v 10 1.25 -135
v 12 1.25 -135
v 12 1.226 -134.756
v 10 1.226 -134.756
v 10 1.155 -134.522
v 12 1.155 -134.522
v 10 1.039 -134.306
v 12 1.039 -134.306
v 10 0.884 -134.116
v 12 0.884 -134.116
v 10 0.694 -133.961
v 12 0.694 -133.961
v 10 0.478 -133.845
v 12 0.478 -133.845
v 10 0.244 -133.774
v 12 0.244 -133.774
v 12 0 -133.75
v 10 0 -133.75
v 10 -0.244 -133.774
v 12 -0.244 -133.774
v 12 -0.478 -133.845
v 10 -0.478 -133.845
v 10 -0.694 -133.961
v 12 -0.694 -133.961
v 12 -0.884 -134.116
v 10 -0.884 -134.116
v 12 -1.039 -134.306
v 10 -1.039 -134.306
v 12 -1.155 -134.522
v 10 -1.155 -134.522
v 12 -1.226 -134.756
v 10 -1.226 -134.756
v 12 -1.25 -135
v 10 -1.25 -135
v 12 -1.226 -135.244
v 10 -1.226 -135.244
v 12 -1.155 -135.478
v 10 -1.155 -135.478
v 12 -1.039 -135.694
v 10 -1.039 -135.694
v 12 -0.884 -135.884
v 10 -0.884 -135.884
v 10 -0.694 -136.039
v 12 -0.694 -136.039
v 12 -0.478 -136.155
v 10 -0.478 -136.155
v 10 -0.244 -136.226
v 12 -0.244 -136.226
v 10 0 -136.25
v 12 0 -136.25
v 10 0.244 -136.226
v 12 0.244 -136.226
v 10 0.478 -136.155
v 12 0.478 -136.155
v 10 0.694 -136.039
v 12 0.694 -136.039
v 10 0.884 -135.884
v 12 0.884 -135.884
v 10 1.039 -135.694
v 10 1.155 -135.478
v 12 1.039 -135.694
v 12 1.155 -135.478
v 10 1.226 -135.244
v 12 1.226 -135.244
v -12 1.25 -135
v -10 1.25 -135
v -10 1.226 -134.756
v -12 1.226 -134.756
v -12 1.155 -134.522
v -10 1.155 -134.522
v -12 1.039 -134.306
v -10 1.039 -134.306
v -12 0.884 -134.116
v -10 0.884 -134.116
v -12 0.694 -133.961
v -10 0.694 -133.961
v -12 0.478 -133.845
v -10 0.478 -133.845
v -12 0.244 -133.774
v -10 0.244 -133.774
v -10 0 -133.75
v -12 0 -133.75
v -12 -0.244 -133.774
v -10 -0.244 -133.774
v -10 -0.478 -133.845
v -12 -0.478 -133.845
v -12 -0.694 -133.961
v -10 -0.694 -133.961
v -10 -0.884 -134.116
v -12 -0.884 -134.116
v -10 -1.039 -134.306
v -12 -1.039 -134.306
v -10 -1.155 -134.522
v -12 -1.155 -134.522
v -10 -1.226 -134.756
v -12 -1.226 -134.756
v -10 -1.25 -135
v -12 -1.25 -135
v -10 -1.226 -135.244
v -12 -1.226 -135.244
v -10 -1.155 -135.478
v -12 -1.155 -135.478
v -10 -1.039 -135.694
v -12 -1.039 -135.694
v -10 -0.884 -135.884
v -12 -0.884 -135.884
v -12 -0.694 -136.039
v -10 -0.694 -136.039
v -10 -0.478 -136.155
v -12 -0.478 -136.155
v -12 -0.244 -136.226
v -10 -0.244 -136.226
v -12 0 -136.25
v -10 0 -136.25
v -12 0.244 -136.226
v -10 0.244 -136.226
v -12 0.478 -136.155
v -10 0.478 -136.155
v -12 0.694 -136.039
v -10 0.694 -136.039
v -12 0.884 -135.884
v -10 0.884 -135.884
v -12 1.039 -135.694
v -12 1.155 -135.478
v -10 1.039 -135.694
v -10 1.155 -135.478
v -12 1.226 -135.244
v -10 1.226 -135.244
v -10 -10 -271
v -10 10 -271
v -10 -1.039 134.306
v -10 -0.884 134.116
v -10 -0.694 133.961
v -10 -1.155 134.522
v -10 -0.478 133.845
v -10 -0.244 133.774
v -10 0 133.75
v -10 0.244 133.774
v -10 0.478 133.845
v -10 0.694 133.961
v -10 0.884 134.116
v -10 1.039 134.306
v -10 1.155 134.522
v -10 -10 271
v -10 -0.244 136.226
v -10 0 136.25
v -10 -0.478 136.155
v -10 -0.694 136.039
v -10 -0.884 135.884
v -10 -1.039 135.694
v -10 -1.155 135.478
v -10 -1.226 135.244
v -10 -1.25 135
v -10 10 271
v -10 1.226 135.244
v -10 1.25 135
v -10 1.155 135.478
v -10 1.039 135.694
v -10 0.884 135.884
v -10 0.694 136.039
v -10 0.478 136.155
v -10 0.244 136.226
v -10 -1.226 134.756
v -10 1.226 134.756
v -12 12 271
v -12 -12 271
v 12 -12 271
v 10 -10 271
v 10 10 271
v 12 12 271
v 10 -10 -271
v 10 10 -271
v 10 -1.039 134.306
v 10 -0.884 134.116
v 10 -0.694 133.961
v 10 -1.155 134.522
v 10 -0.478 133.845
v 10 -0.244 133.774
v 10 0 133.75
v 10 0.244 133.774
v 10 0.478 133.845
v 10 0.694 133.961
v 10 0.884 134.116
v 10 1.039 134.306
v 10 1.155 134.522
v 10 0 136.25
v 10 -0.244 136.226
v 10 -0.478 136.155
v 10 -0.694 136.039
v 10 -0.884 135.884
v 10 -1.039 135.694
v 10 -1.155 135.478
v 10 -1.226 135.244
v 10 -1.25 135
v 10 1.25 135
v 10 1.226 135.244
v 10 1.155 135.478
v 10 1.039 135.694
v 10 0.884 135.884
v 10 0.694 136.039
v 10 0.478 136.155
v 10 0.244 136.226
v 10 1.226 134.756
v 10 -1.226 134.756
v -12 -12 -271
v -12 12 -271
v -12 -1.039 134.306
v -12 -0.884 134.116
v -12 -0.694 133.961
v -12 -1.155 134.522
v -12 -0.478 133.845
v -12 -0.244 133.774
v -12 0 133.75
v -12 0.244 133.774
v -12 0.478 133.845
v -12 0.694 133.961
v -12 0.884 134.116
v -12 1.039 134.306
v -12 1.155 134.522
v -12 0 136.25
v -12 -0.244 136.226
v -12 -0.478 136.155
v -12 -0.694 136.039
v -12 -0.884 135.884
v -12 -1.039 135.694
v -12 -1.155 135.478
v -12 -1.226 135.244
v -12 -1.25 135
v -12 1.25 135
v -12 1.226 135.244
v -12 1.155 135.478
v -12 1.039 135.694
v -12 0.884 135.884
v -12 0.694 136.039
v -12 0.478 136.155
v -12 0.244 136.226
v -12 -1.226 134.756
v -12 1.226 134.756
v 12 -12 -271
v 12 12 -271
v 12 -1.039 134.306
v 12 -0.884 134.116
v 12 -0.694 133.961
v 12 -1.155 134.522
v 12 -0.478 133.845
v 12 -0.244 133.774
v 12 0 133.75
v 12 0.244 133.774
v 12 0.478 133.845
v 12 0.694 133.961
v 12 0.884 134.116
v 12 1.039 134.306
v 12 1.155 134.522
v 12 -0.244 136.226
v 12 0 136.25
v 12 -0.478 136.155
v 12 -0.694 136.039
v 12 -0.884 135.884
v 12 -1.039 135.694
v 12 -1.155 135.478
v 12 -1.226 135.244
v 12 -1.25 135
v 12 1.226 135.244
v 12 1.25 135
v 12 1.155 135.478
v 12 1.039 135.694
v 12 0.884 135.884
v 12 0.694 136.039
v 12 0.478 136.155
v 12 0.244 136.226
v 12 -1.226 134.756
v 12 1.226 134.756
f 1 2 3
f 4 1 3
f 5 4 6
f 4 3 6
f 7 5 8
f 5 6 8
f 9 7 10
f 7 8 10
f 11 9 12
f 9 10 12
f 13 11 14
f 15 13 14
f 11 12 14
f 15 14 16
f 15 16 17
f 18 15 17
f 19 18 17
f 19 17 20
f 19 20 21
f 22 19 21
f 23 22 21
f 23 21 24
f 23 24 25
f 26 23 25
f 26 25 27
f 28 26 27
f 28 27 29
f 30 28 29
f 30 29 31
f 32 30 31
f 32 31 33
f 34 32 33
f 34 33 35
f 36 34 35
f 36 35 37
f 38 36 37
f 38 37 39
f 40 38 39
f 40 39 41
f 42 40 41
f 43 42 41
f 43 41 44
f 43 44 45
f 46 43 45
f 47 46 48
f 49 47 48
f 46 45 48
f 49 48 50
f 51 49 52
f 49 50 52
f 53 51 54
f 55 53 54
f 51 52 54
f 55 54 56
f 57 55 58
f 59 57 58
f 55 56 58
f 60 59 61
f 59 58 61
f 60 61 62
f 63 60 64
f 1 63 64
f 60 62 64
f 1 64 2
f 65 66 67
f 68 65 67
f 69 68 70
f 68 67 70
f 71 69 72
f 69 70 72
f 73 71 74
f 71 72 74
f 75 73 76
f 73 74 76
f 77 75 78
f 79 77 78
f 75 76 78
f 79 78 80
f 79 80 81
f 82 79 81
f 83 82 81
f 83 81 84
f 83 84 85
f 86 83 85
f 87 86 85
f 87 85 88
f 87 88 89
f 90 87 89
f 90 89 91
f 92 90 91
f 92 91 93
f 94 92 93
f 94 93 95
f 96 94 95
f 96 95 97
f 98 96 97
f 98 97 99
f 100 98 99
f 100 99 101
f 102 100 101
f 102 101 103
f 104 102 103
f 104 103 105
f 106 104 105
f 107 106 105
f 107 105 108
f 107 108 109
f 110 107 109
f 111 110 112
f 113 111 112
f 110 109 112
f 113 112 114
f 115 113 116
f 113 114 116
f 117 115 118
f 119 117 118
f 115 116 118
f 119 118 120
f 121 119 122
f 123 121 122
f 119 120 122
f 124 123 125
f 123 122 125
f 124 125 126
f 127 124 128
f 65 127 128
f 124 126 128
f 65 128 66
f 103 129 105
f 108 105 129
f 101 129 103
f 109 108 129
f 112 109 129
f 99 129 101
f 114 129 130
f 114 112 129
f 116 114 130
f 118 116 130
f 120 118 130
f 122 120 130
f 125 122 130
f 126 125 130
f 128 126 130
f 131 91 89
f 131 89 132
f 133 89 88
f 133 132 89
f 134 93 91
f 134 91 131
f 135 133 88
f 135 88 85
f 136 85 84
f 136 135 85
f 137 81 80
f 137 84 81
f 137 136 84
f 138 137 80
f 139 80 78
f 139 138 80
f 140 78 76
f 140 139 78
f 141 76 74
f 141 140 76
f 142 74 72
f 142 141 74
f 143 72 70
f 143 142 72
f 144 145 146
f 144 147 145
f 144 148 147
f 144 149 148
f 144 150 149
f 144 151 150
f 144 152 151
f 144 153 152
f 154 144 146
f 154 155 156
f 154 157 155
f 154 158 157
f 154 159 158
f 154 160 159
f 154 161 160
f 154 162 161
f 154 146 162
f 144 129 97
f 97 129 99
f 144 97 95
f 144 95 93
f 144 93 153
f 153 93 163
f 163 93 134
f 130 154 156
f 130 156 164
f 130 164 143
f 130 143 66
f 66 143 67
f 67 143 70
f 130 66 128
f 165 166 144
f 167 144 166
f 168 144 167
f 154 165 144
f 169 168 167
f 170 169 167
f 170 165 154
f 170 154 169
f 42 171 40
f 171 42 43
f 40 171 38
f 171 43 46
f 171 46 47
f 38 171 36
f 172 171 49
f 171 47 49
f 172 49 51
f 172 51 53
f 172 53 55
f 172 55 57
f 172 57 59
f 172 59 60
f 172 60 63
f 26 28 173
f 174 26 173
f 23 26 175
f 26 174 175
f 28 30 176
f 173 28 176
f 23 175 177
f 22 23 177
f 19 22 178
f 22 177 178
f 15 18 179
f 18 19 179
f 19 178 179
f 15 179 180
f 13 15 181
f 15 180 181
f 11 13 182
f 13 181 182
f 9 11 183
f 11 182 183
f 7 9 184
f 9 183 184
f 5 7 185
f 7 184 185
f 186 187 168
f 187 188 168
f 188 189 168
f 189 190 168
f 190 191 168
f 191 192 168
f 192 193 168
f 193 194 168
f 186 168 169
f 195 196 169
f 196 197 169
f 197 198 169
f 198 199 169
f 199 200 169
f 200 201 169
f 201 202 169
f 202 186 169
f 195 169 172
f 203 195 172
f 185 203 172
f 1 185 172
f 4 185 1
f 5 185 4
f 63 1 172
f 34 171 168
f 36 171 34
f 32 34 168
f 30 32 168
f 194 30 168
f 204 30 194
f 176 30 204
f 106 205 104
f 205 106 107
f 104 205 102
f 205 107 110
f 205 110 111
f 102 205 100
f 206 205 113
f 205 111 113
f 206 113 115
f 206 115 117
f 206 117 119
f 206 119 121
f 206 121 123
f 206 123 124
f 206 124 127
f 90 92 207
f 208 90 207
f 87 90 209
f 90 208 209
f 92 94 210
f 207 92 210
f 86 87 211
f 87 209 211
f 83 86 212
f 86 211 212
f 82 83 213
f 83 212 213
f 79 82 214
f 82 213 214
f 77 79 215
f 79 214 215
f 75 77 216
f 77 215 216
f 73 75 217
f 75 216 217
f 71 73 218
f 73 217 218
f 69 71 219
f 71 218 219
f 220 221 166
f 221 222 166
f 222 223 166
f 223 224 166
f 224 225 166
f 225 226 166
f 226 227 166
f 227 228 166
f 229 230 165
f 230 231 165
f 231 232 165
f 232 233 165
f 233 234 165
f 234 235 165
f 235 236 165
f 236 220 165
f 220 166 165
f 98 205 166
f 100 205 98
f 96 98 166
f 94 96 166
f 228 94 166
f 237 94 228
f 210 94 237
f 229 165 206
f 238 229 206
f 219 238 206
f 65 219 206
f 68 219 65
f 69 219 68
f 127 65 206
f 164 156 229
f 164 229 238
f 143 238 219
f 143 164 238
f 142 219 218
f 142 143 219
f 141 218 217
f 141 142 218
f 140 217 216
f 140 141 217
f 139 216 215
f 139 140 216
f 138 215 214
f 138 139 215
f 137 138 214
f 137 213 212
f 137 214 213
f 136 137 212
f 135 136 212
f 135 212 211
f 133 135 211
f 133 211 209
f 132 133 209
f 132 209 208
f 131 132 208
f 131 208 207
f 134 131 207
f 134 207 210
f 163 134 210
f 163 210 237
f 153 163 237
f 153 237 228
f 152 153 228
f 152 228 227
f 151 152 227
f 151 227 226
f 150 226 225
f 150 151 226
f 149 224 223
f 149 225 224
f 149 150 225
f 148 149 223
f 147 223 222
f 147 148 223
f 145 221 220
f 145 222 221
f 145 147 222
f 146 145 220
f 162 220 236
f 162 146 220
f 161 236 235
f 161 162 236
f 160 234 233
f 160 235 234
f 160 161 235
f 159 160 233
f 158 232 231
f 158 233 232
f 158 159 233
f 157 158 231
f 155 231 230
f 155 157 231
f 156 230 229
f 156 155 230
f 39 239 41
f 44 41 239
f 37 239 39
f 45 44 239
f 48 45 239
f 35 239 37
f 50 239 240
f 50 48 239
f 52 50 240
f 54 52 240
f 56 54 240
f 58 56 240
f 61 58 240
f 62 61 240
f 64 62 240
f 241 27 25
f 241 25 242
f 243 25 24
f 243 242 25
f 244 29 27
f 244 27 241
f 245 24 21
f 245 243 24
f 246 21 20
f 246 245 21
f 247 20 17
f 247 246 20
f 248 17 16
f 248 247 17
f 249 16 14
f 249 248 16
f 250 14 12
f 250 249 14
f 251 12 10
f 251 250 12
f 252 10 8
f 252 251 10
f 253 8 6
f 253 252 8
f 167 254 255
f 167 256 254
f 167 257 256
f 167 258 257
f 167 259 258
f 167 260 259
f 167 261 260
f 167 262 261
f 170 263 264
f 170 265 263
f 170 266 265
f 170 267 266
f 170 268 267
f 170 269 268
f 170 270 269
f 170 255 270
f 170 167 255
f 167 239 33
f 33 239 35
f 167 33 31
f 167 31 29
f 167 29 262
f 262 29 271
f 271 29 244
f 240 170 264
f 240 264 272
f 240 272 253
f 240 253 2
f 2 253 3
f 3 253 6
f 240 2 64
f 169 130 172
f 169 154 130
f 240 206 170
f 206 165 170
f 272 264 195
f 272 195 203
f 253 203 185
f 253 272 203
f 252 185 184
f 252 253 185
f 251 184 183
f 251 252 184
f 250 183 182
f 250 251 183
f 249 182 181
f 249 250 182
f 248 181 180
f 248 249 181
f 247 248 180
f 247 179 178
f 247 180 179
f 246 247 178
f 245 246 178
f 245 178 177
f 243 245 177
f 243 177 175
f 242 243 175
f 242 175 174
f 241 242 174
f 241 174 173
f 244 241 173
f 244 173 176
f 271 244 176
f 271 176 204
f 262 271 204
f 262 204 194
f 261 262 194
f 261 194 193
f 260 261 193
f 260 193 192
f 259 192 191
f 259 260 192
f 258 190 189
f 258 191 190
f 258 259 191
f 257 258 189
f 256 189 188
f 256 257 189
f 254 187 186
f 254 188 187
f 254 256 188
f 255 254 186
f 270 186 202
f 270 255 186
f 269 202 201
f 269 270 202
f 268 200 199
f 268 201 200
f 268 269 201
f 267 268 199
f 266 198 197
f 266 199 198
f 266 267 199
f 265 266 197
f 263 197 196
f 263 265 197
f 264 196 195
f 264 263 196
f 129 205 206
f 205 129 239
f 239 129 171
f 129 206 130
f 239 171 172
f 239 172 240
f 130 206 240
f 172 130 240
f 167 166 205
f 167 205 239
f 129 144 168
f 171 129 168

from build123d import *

# Parameters (mm, degrees)
SKETCH_1_W         = 24
SKETCH_1_H         = 24
SKETCH_1_W_2       = 20
SKETCH_1_H_2       = 20
EXTRUDE_1_DEPTH    = 271
HOLE_WIZARD_M3_3_D = 2.5


with BuildPart() as part:
    # 草图1 → 凸台-拉伸1 (new, symmetric)
    with BuildSketch(Plane.XY):
        Rectangle(SKETCH_1_W, SKETCH_1_H)
        Rectangle(SKETCH_1_W_2, SKETCH_1_H_2, mode=Mode.SUBTRACT)
    extrude(amount=EXTRUDE_1_DEPTH, both=True)

    # M3 螺纹孔的螺纹孔钻头3 (through all)
    with Locations(Plane(origin=(-12, 0, -135), x_dir=(0, -1, 0), z_dir=(-1, 0, 0))):
        with Locations((0, 0)):
            hole_wizard_m3_3 = Hole(HOLE_WIZARD_M3_3_D / 2)

    # 镜向1: M3 螺纹孔的螺纹孔钻头3 across plane
    add(hole_wizard_m3_3.mirror(Plane.XY), mode=Mode.SUBTRACT)


solid = part.part
